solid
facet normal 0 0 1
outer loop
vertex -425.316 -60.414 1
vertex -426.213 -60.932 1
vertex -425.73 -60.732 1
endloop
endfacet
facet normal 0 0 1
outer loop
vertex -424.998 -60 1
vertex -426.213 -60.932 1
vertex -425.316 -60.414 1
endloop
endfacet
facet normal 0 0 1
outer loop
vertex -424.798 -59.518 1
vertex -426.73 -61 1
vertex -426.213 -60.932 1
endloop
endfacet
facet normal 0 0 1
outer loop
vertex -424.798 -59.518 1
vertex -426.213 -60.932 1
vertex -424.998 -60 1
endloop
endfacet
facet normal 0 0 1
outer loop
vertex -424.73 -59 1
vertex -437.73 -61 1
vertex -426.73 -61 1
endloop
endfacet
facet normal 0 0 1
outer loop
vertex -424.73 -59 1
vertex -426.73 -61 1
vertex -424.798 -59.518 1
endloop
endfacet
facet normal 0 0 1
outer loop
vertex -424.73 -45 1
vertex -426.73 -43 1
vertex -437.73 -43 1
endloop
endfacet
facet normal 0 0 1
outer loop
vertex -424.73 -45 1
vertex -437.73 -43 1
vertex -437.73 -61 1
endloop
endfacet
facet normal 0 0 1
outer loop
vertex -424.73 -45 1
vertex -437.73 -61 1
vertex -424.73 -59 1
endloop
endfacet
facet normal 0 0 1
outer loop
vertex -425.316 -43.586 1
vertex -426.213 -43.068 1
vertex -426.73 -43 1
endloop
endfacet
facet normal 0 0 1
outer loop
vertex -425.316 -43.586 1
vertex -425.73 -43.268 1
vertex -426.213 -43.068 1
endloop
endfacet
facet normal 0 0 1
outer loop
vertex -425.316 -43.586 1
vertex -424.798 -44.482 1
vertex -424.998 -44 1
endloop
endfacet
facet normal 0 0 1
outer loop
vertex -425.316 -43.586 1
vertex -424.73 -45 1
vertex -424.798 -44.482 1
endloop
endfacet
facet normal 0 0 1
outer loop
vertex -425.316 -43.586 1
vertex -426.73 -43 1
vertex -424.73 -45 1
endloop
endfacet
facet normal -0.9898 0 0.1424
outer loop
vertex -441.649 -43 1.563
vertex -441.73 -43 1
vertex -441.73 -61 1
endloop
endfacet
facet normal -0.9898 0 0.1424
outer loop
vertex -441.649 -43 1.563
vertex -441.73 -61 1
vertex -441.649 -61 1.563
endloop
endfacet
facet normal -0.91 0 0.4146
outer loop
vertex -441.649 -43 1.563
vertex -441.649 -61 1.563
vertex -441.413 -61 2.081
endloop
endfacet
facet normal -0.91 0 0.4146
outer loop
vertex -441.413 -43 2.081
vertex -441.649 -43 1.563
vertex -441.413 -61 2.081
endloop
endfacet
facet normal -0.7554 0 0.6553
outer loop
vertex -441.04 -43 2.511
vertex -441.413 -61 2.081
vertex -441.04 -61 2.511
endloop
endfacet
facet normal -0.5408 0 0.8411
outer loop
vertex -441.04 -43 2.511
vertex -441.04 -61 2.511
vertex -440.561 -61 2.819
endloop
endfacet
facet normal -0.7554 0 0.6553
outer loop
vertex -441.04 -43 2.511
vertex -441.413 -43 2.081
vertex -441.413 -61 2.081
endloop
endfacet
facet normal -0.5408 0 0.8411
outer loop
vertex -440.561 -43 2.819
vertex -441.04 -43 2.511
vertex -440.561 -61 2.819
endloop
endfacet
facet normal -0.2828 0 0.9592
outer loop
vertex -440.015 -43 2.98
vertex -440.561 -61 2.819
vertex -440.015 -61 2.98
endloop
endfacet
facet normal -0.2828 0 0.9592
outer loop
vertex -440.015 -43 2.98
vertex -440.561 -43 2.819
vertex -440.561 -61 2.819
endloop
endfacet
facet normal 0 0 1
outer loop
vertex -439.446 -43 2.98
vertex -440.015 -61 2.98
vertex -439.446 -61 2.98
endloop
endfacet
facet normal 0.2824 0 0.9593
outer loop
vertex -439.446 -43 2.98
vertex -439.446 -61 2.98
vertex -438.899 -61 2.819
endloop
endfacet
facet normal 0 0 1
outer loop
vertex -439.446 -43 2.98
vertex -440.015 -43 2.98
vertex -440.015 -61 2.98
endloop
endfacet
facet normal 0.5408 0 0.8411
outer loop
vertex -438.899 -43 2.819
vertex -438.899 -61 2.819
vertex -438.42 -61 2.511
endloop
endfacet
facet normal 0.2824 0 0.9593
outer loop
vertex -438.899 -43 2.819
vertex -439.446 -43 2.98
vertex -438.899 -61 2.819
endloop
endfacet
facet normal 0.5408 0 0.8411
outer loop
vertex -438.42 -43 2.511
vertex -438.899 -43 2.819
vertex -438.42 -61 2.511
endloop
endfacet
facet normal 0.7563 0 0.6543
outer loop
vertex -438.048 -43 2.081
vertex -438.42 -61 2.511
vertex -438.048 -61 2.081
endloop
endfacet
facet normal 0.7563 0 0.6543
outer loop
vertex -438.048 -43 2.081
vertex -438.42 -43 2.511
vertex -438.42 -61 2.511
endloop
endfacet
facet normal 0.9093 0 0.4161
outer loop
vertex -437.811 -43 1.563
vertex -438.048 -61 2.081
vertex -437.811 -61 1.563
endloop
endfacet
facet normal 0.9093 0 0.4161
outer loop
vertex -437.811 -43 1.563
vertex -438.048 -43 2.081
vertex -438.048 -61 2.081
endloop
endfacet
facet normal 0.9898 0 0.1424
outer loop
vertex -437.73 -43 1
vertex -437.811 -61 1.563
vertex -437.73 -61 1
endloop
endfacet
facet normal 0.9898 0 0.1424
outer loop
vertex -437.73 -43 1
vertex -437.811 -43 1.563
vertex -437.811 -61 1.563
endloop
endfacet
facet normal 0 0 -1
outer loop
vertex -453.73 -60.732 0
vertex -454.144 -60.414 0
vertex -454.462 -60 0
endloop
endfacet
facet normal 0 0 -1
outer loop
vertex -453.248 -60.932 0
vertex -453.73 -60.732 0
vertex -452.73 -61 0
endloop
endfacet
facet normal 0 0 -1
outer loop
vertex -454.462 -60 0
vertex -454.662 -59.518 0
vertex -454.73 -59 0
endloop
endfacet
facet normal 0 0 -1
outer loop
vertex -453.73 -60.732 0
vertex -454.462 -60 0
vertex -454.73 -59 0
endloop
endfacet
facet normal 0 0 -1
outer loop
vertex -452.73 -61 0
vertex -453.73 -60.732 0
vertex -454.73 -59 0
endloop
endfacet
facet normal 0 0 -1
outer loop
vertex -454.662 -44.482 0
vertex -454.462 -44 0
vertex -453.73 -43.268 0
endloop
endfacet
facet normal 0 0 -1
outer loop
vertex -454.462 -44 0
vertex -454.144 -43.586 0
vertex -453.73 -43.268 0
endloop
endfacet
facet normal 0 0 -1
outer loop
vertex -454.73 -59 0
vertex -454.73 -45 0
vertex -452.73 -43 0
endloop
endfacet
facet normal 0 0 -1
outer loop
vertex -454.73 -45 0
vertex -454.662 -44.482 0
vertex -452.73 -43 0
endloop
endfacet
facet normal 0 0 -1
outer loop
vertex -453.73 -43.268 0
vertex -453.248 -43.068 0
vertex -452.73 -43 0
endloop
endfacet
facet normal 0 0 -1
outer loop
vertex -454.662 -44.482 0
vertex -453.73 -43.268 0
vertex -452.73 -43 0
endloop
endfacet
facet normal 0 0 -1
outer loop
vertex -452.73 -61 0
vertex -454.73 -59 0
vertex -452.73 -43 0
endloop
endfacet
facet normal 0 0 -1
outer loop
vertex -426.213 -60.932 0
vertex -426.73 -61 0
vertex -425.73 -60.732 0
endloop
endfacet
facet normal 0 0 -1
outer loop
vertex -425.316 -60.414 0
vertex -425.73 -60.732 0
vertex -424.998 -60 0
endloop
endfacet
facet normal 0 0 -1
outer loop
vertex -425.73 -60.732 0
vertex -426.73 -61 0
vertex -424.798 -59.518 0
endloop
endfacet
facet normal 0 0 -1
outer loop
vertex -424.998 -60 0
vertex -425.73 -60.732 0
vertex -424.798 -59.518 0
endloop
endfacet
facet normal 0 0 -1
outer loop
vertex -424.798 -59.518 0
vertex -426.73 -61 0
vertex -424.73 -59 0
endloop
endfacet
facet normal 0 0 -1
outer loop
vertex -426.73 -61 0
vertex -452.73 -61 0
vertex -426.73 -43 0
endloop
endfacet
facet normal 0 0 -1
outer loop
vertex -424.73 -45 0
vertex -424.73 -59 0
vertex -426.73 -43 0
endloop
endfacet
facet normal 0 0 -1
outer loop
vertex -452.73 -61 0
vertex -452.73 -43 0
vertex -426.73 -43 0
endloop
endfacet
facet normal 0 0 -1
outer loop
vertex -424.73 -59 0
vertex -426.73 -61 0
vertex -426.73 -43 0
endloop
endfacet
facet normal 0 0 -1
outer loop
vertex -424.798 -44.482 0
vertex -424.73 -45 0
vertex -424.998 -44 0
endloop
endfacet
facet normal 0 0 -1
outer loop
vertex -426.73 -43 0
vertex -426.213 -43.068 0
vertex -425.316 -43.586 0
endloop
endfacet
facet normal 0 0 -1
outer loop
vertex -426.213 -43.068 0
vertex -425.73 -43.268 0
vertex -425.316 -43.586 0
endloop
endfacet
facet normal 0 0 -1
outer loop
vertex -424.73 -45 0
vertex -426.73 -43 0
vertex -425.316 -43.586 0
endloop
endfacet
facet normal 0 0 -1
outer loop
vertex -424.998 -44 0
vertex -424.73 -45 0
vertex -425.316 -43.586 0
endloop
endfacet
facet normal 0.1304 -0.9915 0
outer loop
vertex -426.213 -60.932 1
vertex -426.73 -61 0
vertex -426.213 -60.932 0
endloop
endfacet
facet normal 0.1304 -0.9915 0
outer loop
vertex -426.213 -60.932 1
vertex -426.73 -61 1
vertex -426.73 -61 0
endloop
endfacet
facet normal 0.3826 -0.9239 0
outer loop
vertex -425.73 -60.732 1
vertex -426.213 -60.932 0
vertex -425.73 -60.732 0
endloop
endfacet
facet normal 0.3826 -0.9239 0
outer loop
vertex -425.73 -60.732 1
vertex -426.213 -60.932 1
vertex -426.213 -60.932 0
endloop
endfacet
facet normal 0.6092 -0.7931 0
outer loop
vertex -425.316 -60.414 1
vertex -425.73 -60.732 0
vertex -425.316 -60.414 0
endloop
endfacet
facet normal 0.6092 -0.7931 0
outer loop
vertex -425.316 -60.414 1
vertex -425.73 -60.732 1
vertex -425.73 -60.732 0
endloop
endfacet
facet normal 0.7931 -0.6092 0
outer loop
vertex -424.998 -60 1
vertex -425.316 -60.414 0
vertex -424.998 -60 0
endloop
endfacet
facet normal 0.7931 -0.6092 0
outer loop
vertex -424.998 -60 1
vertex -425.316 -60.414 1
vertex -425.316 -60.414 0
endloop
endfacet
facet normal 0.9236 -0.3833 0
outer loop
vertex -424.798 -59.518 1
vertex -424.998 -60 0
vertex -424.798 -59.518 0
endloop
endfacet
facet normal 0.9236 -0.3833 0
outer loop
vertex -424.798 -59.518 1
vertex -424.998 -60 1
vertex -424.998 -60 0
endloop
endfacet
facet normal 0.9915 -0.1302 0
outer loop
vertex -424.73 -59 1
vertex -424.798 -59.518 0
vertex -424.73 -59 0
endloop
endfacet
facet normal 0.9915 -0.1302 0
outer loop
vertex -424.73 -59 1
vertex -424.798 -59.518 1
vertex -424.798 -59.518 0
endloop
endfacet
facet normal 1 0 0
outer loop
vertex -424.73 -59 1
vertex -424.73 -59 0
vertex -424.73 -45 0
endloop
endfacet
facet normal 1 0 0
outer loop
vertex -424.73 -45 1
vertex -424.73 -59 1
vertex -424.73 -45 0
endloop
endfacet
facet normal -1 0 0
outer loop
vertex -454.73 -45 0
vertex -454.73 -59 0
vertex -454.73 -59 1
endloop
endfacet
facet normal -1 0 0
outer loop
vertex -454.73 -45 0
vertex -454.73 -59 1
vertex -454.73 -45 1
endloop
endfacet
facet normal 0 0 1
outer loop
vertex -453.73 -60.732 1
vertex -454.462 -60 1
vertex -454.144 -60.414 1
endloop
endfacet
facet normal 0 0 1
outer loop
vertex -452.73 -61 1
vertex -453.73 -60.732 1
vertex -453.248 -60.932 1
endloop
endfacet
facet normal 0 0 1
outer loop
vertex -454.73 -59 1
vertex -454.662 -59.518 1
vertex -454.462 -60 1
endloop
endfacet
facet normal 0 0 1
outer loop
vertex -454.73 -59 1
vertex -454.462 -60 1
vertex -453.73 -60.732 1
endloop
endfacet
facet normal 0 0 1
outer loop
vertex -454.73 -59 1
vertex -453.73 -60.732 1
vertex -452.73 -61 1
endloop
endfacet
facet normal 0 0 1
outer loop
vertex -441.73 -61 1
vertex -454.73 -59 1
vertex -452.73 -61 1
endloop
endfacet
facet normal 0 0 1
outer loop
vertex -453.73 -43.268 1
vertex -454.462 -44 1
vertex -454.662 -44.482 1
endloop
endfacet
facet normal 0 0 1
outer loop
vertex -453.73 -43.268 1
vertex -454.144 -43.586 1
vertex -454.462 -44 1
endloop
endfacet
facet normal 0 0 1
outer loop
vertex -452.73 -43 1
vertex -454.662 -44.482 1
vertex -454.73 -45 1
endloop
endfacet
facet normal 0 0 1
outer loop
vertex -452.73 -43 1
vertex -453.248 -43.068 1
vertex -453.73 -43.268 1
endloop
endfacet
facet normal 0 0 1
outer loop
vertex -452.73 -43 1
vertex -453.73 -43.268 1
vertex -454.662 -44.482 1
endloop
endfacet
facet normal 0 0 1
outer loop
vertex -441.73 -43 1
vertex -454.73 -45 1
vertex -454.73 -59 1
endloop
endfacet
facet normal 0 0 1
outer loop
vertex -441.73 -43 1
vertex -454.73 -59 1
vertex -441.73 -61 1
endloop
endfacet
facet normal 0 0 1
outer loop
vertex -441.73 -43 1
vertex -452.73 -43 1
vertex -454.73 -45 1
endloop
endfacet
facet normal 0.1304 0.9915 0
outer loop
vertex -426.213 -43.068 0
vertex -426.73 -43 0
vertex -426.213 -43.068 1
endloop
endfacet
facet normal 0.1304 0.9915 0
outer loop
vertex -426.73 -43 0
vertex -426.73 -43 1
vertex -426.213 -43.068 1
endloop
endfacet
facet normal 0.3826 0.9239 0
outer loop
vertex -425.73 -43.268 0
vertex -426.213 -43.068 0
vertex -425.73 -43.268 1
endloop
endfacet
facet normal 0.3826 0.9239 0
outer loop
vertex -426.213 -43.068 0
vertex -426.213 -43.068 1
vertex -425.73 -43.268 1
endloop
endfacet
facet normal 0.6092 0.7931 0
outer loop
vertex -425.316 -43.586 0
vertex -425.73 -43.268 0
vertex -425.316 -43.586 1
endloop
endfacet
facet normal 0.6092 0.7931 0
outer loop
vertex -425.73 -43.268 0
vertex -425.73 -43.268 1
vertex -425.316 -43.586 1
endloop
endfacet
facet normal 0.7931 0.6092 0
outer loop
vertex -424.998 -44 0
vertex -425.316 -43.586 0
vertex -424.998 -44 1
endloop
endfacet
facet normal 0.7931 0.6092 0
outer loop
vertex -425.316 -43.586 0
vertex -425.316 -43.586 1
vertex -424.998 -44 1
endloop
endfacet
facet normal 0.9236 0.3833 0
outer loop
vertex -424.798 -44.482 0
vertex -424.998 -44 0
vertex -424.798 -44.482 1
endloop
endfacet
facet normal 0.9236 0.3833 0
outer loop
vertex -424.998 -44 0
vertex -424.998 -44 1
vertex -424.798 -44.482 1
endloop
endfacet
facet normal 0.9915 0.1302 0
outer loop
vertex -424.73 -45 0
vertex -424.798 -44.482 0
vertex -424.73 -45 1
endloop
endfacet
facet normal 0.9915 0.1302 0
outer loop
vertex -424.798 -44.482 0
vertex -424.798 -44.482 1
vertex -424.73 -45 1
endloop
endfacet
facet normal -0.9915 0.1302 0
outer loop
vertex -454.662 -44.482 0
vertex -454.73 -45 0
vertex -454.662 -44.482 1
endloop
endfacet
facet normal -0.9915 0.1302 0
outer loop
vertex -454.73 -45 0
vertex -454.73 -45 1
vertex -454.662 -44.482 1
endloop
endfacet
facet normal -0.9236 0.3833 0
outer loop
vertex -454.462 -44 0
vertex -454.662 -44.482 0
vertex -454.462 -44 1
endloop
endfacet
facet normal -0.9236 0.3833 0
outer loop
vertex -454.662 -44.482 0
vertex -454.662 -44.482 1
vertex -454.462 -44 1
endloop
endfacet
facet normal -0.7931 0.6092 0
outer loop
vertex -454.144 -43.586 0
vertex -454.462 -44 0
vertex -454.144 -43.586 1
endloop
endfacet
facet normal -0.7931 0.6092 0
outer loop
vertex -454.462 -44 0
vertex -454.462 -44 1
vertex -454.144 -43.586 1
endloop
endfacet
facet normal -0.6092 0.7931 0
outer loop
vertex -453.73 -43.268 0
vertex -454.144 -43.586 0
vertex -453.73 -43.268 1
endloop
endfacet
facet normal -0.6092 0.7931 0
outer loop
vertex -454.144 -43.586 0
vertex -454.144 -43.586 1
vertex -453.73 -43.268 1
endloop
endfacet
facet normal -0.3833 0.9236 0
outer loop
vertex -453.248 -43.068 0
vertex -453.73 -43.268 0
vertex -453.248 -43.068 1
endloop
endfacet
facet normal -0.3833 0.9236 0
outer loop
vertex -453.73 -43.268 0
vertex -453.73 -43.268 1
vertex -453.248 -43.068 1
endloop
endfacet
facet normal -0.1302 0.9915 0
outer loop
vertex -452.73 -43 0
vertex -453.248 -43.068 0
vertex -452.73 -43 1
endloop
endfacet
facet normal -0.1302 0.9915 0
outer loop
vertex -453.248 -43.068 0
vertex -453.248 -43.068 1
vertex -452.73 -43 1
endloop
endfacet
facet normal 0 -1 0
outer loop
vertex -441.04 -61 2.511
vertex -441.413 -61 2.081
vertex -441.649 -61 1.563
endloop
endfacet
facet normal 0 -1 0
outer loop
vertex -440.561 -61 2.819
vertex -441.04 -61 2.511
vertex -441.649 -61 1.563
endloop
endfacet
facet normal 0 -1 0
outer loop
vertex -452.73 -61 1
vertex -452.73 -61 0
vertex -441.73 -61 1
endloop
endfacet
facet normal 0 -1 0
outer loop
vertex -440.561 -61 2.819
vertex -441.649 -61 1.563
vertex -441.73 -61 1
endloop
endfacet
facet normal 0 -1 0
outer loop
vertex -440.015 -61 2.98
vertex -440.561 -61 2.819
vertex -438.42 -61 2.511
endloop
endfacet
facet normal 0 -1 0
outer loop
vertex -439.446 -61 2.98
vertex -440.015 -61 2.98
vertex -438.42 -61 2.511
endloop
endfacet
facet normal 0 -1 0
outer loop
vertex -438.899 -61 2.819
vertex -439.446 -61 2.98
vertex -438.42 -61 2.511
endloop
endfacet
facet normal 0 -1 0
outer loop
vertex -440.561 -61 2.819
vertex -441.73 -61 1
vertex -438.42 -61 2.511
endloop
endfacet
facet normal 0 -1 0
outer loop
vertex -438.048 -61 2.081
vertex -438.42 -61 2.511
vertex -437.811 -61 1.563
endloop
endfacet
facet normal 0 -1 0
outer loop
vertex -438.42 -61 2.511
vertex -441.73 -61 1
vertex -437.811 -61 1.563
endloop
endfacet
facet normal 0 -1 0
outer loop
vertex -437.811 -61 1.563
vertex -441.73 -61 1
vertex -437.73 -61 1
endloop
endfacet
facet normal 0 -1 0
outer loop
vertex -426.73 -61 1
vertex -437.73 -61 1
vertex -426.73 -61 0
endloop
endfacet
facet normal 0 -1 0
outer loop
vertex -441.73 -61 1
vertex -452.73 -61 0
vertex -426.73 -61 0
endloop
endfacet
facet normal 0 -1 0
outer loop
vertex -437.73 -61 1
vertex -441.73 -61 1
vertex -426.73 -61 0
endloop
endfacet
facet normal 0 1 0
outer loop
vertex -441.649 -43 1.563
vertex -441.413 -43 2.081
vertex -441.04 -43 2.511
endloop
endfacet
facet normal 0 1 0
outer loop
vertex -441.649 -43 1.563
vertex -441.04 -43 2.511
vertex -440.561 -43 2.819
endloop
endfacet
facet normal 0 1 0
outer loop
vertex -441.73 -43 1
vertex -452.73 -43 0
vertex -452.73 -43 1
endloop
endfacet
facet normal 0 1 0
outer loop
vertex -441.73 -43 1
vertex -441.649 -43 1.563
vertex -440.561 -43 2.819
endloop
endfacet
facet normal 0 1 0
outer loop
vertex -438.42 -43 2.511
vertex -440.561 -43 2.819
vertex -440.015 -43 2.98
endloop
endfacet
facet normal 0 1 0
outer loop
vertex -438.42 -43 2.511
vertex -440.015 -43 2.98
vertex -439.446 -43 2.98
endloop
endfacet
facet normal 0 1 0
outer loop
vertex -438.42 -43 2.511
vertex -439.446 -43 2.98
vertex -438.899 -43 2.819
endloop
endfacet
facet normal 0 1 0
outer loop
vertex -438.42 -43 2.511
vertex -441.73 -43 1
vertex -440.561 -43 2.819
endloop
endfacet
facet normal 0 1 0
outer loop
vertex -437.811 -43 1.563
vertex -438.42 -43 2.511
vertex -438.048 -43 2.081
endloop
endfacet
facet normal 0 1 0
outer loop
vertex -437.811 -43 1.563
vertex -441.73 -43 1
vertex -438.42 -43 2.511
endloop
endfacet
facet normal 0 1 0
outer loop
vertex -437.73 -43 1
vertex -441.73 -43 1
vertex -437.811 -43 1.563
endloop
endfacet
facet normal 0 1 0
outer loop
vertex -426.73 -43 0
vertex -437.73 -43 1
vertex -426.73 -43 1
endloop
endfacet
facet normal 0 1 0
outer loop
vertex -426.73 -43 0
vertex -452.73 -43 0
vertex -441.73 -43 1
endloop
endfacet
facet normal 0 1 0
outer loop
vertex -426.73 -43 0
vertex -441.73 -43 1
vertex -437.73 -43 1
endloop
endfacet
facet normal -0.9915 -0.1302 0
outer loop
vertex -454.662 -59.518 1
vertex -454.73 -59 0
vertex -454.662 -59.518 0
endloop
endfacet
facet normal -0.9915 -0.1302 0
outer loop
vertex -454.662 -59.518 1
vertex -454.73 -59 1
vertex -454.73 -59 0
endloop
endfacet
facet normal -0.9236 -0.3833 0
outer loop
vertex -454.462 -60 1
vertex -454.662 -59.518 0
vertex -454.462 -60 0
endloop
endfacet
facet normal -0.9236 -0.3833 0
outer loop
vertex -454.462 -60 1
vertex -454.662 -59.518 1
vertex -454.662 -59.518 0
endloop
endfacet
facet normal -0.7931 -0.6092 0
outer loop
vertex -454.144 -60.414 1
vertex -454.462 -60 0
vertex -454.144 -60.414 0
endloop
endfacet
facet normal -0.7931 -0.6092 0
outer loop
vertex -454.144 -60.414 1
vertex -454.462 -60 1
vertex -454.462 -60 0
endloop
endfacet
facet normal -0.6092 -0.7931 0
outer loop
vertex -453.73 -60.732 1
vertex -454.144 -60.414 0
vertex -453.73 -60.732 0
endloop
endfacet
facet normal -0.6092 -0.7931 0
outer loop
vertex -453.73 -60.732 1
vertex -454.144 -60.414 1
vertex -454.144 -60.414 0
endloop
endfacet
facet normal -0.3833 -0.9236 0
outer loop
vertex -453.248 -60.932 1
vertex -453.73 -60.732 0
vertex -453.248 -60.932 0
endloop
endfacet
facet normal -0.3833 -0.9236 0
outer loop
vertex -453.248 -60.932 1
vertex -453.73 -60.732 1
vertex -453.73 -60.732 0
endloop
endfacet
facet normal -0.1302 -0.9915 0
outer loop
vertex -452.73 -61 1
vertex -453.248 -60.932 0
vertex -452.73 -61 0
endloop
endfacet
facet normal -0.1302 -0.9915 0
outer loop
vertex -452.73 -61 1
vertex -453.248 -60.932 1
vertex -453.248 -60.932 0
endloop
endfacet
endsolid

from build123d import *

# Parameters (mm, degrees)
SKETCH1_W           = 30
SKETCH1_H           = 18
BOSS_EXTRUDE1_DEPTH = 1
BOSS_EXTRUDE2_DEPTH = 18
FILLET1_R           = 2


with BuildPart() as part:
    # Sketch1 → Boss-Extrude1 (new body)
    with BuildSketch(Plane.XY):
        with Locations((-439.730210405, -52)):
            Rectangle(SKETCH1_W, SKETCH1_H)
    extrude(amount=BOSS_EXTRUDE1_DEPTH)

    # Sketch2 → Boss-Extrude2 (add)
    with BuildSketch(Plane(origin=(0, -43, 0), x_dir=(1, 0, 0), z_dir=(0, 1, 0))):
        with BuildLine():
            Line((-437.730210405, -1), (-441.730210405, -1))
            ThreePointArc((-441.730210405, -1), (-439.730210405, -3), (-437.730210405, -1))
        make_face()
    extrude(amount=-BOSS_EXTRUDE2_DEPTH)

    # Fillet1
    fillet1_edges = [part.edges().sort_by_distance(p)[0] for p in [
        (-454.730210405, -43, 0.5),
        (-424.730210405, -43, 0.5),
        (-454.730210405, -61, 0.5),
        (-424.730210405, -61, 0.5),
    ]]
    fillet(fillet1_edges, radius=FILLET1_R)


solid = part.part
